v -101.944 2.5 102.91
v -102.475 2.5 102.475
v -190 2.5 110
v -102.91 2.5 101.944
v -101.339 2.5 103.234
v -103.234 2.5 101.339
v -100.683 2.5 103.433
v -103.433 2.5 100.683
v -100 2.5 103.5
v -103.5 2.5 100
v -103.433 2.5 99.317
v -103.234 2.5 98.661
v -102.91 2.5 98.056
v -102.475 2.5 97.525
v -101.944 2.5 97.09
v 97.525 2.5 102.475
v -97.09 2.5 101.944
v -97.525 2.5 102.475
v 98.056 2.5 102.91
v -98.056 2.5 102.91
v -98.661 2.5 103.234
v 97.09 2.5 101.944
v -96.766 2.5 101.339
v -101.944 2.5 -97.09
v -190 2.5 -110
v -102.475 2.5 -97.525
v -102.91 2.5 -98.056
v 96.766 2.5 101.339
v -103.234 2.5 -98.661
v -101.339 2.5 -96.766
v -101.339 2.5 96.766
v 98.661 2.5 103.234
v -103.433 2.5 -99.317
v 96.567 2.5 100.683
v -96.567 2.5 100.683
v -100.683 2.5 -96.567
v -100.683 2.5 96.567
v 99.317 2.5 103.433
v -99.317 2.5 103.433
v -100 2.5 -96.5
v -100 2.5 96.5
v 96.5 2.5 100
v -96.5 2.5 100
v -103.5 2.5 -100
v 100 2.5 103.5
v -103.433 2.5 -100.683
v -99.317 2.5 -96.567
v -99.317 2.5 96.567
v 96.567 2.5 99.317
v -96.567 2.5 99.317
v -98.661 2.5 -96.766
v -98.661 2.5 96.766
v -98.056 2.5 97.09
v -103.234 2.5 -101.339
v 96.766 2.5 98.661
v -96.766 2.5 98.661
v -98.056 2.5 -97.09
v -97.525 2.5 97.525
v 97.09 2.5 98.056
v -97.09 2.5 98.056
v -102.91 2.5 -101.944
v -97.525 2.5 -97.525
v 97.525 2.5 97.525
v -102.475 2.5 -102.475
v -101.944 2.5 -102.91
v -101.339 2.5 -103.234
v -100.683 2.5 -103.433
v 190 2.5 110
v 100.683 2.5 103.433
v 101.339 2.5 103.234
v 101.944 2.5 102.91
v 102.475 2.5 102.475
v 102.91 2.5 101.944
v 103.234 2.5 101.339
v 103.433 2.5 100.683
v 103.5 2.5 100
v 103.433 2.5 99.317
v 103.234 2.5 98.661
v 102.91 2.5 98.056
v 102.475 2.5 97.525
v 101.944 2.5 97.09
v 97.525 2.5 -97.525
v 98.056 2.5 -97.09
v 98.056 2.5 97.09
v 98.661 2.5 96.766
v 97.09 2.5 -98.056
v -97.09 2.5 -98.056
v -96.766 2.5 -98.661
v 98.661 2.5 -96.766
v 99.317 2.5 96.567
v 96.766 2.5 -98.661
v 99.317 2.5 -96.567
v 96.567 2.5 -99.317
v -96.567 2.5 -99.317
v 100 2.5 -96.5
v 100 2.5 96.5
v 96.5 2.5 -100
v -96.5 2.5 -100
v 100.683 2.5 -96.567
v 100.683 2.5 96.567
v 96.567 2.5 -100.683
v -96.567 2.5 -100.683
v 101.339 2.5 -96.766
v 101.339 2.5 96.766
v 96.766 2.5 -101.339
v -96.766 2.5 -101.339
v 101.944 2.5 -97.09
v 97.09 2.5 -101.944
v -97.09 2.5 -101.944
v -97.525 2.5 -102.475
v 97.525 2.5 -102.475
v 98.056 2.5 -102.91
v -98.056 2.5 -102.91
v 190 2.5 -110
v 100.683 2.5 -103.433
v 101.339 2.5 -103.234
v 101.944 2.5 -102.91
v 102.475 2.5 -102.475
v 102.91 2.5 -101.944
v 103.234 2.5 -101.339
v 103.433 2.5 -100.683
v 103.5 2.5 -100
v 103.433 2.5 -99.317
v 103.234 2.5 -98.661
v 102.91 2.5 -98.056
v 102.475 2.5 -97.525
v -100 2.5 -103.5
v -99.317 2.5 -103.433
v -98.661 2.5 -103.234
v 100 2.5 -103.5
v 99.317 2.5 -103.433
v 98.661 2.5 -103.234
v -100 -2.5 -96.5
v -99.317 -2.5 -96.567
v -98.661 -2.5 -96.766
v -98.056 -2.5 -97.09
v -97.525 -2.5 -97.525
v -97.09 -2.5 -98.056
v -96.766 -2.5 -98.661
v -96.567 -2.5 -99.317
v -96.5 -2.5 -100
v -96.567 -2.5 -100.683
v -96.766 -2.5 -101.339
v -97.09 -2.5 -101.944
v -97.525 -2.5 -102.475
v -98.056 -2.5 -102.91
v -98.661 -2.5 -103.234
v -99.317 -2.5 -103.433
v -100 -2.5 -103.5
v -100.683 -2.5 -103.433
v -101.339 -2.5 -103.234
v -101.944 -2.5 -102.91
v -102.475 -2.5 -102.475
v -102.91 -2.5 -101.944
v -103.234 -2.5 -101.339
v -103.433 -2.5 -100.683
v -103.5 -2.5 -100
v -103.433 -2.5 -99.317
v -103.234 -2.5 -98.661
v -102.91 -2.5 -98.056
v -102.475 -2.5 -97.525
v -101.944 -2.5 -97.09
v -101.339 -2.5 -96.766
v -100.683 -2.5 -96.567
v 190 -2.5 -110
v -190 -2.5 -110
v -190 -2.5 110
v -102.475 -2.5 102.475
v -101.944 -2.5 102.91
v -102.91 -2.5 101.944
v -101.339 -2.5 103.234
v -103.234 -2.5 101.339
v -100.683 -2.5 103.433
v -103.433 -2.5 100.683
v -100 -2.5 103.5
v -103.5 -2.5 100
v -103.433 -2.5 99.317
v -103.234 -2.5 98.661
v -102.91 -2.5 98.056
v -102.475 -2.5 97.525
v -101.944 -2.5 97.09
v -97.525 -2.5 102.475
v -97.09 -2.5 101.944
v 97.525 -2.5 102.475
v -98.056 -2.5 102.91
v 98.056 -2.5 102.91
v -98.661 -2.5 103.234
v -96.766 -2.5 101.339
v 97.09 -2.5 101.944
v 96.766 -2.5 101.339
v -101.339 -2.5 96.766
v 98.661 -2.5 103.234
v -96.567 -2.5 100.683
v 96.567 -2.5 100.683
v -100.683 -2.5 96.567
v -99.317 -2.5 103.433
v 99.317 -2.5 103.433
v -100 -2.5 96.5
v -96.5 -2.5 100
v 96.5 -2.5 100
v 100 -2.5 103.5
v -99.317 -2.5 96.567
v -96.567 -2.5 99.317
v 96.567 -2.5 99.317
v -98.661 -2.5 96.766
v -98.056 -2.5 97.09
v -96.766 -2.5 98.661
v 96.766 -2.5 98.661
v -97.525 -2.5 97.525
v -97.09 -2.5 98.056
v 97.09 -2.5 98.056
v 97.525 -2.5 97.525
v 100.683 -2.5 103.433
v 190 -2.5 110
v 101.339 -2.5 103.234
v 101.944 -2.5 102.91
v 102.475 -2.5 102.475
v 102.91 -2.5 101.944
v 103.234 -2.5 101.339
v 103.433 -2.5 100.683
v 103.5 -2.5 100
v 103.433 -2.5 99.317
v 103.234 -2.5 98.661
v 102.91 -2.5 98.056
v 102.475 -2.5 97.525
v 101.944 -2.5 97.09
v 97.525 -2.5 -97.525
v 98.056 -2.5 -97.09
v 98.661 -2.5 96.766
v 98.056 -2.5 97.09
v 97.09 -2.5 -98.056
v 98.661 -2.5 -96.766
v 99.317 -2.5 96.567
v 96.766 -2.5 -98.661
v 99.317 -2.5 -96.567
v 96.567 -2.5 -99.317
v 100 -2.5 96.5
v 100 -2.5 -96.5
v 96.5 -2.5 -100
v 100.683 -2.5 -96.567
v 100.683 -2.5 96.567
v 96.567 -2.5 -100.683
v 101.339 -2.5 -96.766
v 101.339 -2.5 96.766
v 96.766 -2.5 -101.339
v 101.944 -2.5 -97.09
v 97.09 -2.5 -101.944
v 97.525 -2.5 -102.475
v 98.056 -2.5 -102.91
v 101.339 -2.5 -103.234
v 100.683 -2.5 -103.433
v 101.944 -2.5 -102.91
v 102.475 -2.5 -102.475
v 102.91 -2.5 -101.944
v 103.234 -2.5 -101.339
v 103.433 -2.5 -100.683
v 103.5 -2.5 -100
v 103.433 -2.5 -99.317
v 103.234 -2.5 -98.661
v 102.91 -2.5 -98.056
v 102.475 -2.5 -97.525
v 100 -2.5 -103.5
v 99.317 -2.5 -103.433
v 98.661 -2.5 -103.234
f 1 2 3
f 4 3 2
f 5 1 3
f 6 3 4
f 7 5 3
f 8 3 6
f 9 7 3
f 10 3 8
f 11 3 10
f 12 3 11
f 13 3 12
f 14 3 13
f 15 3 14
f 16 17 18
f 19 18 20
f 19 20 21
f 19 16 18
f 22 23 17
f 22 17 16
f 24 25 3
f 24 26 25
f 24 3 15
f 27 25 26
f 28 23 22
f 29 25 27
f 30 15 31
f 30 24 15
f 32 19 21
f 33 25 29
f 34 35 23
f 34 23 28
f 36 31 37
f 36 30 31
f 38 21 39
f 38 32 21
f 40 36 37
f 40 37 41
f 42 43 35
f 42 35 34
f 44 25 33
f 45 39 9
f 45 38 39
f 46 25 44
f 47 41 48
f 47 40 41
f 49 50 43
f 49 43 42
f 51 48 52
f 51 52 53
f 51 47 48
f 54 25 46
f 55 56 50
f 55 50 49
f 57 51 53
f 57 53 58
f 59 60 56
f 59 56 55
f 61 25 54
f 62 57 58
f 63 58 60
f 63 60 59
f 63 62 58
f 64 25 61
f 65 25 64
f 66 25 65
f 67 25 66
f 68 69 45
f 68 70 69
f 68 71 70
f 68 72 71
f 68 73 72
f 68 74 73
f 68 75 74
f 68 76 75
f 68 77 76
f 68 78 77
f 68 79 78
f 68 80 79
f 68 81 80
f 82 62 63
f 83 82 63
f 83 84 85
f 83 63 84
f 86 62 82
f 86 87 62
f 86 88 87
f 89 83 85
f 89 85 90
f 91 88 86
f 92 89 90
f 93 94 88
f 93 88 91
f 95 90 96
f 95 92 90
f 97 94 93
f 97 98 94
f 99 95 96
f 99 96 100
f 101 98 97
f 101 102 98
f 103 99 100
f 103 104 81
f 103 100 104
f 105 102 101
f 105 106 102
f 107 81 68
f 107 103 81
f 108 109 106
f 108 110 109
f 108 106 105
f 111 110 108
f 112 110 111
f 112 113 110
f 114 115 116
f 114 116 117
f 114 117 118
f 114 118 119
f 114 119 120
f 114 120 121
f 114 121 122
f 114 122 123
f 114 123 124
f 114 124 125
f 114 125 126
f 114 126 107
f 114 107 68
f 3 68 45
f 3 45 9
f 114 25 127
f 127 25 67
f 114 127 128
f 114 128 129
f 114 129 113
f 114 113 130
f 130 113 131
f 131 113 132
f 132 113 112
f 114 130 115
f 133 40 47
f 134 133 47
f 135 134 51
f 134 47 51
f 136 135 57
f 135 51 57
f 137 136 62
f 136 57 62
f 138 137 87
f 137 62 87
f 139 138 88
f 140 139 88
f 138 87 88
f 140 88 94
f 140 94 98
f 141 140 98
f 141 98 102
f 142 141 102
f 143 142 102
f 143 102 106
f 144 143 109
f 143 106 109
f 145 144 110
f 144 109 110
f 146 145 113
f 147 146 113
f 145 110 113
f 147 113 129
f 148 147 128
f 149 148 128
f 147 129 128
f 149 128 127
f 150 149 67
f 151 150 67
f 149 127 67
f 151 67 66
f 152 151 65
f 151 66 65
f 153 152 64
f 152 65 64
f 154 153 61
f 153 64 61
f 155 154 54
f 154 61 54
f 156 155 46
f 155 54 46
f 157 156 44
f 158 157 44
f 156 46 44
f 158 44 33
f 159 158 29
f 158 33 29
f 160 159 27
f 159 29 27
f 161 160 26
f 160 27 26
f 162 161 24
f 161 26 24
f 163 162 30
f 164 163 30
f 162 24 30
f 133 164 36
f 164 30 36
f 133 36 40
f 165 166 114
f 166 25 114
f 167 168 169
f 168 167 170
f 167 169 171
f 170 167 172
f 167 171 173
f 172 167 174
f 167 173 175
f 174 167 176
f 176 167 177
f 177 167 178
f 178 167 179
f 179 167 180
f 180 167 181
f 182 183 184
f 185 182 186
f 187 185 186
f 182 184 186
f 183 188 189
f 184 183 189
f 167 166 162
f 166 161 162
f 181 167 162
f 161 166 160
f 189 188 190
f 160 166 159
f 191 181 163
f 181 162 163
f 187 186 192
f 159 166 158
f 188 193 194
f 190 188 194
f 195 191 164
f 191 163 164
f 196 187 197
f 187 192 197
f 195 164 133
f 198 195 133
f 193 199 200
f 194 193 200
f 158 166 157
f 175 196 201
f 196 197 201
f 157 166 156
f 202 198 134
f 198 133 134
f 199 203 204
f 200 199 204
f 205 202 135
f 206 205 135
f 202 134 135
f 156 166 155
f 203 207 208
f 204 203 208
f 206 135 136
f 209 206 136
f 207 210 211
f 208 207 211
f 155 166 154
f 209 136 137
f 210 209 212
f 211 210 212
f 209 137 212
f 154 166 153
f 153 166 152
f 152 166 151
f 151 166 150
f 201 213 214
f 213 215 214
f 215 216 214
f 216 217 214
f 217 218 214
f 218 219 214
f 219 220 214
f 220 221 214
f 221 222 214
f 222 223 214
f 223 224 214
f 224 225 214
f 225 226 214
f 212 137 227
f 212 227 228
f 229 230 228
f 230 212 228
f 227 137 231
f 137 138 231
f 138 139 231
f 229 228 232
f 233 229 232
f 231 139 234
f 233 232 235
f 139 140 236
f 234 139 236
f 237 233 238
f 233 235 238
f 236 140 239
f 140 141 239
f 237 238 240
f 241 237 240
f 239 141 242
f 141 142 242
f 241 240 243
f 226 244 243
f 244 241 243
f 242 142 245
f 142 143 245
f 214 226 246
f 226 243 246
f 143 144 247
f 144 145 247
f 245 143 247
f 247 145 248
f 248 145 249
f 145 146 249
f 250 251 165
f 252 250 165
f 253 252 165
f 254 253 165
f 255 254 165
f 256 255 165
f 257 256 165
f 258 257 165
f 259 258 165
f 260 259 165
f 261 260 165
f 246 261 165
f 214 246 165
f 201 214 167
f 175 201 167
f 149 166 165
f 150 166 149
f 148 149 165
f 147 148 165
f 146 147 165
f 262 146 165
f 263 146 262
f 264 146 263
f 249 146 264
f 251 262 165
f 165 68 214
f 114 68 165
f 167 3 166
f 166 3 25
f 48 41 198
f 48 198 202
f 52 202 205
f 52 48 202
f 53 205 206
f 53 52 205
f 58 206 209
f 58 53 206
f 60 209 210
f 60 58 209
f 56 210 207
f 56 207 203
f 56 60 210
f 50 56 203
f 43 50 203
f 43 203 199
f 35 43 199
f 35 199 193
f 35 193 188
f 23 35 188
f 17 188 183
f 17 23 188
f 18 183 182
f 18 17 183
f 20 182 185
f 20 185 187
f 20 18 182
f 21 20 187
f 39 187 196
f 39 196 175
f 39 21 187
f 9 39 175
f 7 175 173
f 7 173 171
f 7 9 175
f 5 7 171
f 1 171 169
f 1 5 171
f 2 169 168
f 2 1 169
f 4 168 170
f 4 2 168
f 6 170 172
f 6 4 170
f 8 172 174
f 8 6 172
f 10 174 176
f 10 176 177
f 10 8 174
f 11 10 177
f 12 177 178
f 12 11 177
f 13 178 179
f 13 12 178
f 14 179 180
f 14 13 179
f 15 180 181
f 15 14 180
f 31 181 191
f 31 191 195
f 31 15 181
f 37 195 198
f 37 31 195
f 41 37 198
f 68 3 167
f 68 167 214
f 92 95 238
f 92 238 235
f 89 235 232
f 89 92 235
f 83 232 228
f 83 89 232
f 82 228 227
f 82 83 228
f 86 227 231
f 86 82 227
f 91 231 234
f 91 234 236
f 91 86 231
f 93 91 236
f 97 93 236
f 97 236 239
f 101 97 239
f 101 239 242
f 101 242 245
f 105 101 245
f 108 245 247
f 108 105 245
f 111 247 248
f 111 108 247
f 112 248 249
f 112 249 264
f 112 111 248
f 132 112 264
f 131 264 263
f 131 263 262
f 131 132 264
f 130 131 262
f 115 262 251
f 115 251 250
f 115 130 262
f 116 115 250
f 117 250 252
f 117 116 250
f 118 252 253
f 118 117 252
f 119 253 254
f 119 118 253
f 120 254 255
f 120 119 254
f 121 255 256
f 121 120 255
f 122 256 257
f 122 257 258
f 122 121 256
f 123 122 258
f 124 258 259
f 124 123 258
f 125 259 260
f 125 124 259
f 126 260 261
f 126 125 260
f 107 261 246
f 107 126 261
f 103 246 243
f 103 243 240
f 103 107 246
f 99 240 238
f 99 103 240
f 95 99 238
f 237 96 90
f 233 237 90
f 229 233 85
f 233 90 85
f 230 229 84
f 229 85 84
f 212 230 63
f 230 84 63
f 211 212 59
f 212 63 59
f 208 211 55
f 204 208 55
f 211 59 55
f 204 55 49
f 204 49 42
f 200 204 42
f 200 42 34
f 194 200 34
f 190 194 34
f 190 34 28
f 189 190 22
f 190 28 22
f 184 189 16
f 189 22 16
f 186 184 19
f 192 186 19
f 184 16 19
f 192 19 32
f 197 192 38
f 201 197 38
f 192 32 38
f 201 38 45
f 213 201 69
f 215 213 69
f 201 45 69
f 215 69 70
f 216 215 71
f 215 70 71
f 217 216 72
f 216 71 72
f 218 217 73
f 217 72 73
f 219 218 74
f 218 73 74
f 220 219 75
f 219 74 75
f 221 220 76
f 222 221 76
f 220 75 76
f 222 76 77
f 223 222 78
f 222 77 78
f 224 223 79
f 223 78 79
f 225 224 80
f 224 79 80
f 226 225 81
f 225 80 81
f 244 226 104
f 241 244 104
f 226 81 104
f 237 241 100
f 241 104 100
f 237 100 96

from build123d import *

# Parameters (mm, degrees)
SKETCH1_W               = 380
SKETCH1_H               = 220
BOSS_EXTRUDE1_DEPTH     = 2.5
SKETCH4_R               = 3.5
CUT_EXTRUDE1_DEPTH      = 5
MIRROR4_COPY_1_SKETCH_R = 3.5
MIRROR4_COPY_1_DEPTH    = 5


with BuildPart() as part:
    # Sketch1 → Boss-Extrude1 (new, symmetric)
    with BuildSketch(Plane(origin=(0, 0, 0), x_dir=(1, 0, 0), z_dir=(0, 1, 0))):
        Rectangle(SKETCH1_W, SKETCH1_H)
    extrude(amount=BOSS_EXTRUDE1_DEPTH, both=True)

    # Sketch4 → Cut-Extrude1 (cut)
    with BuildSketch(Plane(origin=(0, 2.5, 0), x_dir=(1, 0, 0), z_dir=(0, 1, 0))):
        with Locations(Location((-100, 100, 0), (0, 0, 270))):
            Circle(SKETCH4_R)
    cut_extrude1 = extrude(amount=-CUT_EXTRUDE1_DEPTH, mode=Mode.SUBTRACT)

    # Mirror3: Cut-Extrude1 across plane
    add(cut_extrude1.mirror(Plane(origin=(0, 0, 0), x_dir=(0, 0, 1), z_dir=(1, 0, 0))), mode=Mode.SUBTRACT)

    # Mirror4: Cut-Extrude1 across plane
    add(cut_extrude1.mirror(Plane.XY), mode=Mode.SUBTRACT)

    # Mirror4 copy 1 sketch → Mirror4 copy 1 (cut)
    with BuildSketch(Plane(origin=(0, 2.5, 0), x_dir=(-1, 0, 0), z_dir=(0, 1, 0))):
        with Locations(Location((-100, 100, 0), (0, 0, 270))):
            Circle(MIRROR4_COPY_1_SKETCH_R)
    extrude(amount=-MIRROR4_COPY_1_DEPTH, mode=Mode.SUBTRACT)


solid = part.part
